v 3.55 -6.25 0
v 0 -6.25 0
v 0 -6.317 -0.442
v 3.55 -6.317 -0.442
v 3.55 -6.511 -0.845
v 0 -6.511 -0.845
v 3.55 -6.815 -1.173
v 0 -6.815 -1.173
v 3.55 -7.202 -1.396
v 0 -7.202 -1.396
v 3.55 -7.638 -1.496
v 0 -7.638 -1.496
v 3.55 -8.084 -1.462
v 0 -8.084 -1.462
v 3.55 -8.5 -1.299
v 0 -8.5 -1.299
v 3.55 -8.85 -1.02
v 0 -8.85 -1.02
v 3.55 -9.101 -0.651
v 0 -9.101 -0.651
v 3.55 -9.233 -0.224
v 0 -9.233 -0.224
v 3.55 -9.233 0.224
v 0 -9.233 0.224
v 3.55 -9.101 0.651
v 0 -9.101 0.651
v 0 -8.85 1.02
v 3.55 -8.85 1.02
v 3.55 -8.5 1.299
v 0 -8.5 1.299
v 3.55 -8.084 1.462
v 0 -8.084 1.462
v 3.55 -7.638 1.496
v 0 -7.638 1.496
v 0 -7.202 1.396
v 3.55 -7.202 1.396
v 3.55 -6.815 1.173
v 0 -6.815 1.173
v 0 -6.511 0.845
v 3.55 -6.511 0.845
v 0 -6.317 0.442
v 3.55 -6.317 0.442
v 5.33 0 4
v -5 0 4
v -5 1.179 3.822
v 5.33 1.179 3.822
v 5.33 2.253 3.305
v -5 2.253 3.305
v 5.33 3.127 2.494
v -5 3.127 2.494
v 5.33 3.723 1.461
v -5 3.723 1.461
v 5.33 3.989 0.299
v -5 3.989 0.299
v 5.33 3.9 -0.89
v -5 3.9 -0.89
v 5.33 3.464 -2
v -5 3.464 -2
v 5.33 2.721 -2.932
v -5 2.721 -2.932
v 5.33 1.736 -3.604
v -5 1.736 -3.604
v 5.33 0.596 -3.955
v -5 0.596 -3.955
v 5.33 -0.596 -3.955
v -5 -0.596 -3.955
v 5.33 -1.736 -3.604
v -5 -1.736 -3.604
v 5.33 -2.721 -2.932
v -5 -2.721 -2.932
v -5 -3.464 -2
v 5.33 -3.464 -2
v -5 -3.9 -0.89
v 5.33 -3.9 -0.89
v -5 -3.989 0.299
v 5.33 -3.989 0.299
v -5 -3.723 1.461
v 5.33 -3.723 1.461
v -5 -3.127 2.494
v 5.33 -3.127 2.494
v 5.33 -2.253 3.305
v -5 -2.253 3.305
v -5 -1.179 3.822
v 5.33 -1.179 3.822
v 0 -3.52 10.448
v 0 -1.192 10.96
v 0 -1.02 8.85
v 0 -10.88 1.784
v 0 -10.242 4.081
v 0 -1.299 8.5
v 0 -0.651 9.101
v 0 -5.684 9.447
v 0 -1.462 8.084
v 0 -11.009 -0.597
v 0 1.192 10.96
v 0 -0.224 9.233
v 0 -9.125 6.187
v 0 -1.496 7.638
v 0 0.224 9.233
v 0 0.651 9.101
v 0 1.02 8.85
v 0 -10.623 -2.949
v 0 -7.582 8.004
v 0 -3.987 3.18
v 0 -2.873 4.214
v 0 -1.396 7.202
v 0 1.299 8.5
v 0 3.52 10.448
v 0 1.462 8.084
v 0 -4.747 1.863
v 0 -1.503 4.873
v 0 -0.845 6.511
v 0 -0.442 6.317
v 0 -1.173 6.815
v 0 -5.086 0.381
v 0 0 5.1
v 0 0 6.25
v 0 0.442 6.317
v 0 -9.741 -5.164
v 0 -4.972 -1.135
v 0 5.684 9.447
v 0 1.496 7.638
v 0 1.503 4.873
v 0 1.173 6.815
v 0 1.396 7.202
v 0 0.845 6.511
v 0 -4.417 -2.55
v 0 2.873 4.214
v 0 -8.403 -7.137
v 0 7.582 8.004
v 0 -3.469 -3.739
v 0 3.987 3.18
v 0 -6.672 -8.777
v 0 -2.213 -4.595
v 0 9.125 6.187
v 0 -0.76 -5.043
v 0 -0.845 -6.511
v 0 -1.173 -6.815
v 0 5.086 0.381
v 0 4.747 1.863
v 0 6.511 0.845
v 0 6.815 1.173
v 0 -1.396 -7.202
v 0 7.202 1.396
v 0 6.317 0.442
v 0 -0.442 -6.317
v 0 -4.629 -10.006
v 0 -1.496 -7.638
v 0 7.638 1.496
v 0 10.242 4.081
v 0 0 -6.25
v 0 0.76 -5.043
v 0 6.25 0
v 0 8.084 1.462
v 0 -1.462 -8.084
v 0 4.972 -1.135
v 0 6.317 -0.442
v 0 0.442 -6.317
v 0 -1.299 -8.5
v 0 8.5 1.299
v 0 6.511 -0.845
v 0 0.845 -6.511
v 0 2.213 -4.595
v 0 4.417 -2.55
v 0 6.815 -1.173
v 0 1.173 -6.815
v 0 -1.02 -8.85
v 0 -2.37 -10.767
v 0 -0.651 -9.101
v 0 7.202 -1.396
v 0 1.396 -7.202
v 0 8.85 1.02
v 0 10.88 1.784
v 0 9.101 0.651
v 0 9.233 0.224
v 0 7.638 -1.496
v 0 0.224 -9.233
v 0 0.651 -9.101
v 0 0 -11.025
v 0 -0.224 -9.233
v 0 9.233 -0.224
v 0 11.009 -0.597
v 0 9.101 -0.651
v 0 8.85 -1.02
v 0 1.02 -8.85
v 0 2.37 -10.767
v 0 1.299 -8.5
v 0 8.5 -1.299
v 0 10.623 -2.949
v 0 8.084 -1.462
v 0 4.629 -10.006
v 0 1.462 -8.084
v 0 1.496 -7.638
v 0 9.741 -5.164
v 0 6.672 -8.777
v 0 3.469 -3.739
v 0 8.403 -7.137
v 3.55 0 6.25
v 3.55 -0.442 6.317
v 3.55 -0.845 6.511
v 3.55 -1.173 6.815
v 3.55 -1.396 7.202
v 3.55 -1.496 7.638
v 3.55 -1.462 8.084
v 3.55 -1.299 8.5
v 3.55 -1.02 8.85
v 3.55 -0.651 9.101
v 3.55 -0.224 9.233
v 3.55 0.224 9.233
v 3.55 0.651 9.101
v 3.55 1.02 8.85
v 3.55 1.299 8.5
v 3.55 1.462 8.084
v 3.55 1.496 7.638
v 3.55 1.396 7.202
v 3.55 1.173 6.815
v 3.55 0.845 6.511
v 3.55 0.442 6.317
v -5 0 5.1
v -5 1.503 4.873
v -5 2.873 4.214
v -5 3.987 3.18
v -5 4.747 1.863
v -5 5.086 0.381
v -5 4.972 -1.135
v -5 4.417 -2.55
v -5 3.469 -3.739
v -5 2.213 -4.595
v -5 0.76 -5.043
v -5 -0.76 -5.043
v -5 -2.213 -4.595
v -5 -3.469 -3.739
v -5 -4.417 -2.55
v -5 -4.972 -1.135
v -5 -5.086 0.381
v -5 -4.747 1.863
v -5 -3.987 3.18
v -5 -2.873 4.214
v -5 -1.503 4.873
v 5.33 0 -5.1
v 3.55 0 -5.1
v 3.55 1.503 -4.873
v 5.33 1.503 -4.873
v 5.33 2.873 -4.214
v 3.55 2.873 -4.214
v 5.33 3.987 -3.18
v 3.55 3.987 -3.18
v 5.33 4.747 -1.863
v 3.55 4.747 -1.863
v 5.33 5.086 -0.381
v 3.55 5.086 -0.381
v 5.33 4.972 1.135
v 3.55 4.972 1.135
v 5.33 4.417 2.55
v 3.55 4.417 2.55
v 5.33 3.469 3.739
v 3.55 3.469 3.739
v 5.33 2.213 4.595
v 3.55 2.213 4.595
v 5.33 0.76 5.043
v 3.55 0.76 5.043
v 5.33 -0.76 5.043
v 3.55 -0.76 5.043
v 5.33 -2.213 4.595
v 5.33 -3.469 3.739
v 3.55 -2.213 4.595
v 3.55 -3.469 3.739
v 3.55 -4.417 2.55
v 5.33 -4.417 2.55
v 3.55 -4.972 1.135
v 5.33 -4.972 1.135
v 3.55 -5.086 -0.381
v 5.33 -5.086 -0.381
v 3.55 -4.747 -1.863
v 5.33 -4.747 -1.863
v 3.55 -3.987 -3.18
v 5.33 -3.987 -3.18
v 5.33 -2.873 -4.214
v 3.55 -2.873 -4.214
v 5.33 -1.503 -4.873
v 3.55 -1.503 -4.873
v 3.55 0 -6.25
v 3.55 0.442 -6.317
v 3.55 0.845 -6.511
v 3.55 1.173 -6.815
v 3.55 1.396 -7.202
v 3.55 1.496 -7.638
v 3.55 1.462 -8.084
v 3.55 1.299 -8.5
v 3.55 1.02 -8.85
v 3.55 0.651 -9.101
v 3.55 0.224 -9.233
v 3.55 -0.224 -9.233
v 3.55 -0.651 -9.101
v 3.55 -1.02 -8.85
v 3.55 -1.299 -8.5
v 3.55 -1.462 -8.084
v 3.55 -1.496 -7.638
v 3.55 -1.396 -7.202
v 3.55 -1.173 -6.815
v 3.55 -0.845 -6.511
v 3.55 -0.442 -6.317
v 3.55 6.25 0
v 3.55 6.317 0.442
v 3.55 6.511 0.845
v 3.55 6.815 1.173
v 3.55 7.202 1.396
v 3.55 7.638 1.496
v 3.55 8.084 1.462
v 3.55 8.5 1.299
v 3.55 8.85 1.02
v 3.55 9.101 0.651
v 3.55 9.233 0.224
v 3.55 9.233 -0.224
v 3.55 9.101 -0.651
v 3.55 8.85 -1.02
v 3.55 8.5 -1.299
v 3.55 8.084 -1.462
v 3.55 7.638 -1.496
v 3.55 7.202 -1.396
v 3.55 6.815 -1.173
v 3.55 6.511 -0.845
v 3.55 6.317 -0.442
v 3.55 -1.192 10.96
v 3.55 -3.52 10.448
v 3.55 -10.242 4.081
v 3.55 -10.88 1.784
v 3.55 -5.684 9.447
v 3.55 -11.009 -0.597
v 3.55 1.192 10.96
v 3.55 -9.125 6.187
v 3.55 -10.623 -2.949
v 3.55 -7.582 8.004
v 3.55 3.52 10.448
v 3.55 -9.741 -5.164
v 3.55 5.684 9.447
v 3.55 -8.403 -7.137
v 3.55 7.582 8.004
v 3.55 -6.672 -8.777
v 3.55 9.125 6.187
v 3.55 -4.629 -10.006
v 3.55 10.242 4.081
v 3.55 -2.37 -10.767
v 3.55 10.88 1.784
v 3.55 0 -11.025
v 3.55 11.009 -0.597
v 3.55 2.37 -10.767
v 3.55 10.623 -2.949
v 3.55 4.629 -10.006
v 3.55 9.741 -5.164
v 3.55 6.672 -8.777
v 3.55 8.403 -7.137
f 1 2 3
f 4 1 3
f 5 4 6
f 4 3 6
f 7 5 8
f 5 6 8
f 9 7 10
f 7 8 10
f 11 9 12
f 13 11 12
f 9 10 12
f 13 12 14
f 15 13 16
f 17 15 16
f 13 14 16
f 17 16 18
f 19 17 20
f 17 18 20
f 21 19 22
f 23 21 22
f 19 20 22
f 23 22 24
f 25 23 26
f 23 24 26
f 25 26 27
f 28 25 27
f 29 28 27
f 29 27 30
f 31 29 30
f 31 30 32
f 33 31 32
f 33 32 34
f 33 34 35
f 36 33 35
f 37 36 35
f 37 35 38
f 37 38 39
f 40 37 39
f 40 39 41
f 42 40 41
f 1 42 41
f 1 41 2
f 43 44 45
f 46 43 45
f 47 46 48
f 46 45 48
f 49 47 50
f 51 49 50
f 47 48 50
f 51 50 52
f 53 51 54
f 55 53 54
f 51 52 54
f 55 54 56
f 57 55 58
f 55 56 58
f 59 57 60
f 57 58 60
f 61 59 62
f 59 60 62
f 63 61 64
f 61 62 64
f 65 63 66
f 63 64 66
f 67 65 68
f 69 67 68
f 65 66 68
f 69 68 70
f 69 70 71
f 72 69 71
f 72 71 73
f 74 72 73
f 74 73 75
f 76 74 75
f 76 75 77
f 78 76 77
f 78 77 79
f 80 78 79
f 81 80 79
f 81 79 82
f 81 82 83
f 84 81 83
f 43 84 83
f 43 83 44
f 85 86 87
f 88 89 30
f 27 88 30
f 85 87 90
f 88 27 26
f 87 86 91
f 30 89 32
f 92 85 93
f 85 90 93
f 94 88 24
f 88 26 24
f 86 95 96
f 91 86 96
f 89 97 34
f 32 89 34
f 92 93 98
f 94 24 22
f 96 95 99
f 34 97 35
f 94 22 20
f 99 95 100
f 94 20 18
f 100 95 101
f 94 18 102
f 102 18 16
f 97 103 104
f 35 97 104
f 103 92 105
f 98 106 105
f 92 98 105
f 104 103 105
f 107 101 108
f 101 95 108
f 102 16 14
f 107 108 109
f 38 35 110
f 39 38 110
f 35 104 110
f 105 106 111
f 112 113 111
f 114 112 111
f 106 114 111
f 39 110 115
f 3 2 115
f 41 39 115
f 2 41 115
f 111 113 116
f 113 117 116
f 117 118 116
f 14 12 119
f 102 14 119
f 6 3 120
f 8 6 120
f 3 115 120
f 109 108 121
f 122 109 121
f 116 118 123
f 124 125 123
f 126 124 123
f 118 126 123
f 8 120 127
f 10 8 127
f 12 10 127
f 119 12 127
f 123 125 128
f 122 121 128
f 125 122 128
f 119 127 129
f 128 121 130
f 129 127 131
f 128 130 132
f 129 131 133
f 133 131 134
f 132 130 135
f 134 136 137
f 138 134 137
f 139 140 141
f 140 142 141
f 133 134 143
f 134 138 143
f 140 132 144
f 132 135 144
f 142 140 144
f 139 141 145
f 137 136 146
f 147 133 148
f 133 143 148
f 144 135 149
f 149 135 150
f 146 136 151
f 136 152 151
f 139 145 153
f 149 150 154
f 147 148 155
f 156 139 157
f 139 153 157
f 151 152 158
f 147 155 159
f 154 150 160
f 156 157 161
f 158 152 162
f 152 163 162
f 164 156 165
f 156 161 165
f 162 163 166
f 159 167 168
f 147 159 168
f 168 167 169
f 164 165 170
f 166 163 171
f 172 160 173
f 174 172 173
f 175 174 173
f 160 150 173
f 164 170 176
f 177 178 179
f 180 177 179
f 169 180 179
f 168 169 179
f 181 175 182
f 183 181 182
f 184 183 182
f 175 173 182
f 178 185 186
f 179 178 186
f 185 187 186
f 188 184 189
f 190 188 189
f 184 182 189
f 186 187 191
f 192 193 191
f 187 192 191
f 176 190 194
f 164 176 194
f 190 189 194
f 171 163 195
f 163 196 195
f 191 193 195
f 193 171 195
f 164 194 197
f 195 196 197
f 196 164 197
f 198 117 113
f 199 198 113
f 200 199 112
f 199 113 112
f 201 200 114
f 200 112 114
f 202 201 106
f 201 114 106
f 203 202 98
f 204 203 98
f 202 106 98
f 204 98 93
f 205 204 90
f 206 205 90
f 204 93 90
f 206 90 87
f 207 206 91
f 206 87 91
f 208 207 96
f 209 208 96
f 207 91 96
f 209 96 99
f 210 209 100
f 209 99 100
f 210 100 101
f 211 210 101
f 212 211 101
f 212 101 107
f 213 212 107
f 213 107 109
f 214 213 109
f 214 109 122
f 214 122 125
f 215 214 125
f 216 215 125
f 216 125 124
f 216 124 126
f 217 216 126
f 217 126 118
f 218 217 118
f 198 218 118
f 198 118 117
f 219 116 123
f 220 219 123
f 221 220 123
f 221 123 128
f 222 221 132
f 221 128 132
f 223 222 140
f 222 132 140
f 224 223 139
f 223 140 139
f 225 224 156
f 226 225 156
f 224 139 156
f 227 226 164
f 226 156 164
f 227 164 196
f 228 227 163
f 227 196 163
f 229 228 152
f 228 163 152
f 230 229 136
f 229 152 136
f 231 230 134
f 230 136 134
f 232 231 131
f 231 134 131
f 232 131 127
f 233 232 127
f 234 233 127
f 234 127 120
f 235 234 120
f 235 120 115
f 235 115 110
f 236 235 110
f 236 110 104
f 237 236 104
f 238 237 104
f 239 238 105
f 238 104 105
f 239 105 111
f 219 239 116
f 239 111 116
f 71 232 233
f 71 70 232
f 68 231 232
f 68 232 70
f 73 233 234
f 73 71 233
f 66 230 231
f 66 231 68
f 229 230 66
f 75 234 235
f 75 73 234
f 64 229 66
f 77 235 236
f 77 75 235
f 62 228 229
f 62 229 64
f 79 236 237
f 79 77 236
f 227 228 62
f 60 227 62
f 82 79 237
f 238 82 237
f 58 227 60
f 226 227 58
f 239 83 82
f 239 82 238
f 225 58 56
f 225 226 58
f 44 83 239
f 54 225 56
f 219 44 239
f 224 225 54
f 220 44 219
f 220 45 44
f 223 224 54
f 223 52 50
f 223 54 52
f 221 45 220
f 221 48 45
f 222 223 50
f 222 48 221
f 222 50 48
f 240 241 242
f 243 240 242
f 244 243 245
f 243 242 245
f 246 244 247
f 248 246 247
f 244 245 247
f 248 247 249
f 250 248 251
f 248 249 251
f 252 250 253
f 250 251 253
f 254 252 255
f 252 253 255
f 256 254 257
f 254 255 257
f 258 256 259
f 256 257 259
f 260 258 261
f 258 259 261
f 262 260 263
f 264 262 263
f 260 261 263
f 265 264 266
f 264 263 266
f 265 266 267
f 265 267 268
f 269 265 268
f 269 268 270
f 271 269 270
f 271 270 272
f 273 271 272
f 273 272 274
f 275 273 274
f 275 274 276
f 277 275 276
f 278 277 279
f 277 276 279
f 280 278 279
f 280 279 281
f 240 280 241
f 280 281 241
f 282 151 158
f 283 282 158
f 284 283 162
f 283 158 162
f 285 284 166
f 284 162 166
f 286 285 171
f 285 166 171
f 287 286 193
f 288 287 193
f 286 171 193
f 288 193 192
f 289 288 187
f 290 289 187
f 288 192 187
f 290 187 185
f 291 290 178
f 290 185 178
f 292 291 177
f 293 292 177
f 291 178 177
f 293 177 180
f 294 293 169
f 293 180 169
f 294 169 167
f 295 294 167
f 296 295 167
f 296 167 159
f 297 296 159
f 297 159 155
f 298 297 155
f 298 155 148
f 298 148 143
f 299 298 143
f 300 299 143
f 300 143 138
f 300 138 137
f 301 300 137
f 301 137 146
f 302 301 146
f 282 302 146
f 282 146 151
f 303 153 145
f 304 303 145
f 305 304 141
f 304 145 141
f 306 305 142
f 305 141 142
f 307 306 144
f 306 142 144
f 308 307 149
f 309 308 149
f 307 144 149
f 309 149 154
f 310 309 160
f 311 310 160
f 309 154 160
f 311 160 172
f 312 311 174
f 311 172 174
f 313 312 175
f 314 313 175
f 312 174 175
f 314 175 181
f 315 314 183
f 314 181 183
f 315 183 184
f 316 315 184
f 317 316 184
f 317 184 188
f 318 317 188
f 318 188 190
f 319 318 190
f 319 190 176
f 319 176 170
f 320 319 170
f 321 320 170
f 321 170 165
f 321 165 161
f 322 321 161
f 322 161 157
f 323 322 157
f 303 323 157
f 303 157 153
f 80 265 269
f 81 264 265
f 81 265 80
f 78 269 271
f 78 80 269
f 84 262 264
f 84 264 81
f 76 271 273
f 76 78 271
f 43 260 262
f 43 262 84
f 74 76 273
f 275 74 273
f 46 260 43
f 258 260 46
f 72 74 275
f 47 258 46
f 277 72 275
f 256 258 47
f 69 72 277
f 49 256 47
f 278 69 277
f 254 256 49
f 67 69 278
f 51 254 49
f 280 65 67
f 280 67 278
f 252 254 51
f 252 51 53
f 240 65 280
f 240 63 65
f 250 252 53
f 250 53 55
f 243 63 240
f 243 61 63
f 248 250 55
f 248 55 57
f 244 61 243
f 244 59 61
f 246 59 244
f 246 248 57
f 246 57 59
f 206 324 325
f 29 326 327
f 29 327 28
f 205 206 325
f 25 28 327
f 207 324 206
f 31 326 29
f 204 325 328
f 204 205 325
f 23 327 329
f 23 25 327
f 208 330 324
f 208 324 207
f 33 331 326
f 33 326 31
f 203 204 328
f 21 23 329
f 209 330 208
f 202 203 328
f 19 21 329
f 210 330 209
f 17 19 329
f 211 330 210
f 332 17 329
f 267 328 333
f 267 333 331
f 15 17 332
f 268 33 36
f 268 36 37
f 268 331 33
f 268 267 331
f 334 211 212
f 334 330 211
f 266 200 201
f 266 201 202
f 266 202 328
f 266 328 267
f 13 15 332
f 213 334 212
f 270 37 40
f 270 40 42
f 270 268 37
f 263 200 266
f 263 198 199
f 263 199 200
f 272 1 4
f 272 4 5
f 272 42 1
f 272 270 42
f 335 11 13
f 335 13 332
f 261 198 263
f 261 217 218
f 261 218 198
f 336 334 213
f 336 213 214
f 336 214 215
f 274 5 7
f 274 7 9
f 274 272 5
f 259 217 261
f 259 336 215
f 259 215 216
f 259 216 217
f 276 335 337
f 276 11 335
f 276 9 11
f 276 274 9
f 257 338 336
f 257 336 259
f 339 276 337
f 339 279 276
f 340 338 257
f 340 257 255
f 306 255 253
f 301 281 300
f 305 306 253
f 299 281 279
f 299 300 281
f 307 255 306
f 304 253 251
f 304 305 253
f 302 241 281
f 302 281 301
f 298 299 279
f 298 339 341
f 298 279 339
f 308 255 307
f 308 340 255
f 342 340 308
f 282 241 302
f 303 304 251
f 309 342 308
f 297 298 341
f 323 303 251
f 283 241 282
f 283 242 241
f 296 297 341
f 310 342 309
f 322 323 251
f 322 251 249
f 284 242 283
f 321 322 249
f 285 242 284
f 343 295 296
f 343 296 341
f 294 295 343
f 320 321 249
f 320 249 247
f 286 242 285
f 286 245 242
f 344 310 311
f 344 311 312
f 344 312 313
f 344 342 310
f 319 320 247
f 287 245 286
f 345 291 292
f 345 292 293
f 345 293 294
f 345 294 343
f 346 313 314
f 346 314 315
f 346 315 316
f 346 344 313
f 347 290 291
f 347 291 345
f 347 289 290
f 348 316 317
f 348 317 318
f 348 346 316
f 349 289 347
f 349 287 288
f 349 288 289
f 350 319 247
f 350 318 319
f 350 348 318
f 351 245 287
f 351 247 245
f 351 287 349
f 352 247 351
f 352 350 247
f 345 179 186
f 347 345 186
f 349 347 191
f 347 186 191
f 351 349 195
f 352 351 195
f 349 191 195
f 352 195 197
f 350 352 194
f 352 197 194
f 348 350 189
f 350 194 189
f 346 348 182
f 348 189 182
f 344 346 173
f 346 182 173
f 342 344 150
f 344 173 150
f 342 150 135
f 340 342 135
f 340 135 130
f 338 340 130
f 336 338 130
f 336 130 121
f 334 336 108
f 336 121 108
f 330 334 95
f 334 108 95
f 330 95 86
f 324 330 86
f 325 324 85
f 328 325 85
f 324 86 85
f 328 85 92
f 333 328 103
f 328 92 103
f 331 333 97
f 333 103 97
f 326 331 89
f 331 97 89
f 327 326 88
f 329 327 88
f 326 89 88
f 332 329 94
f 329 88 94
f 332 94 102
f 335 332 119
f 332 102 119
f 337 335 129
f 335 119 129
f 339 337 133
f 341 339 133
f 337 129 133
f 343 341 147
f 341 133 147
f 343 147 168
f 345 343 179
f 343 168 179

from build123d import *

# Parameters (mm, degrees)
SKETCH1_R           = 11.025
BOSS_EXTRUDE1_DEPTH = 3.55
SKETCH2_R           = 5.1
BOSS_EXTRUDE2_DEPTH = 1.78
SKETCH3_R           = 5.1
BOSS_EXTRUDE3_DEPTH = 5
SKETCH5_R           = 4
CUT_EXTRUDE1_DEPTH  = 11.33
SKETCH6_R           = 1.5
CUT_EXTRUDE2_DEPTH  = 6.33
CIRPATTERN1_COUNT   = 4


with BuildPart() as part:
    # Sketch1 → Boss-Extrude1 (new body)
    with BuildSketch(Plane(origin=(0, 0, 0), x_dir=(0, 0, -1), z_dir=(1, 0, 0))):
        Circle(SKETCH1_R)
    extrude(amount=BOSS_EXTRUDE1_DEPTH)

    # Sketch2 → Boss-Extrude2 (add)
    with BuildSketch(Plane(origin=(3.55, 0, 0), x_dir=(0, 0, -1), z_dir=(1, 0, 0))):
        Circle(SKETCH2_R)
    extrude(amount=BOSS_EXTRUDE2_DEPTH)

    # Sketch3 → Boss-Extrude3 (add)
    with BuildSketch(Plane.ZY):
        Circle(SKETCH3_R)
    extrude(amount=BOSS_EXTRUDE3_DEPTH)

    # Sketch5 → Cut-Extrude1 (cut, through all)
    with BuildSketch(Plane.ZY.offset(5)):
        Circle(SKETCH5_R)
    extrude(amount=-CUT_EXTRUDE1_DEPTH, mode=Mode.SUBTRACT)

    # Sketch6 → Cut-Extrude2 (cut, through all)
    with BuildSketch(Plane.ZY):
        with Locations((-7.75, 0)):
            Circle(SKETCH6_R)
    cut_extrude2 = extrude(amount=-CUT_EXTRUDE2_DEPTH, mode=Mode.SUBTRACT)

    # CirPattern1: Cut-Extrude2 ×4 about axis
    cirpattern1_axis = Axis((0, 0, 0), (1, 0, 0))
    for i in range(1, CIRPATTERN1_COUNT):
        add(cut_extrude2.rotate(cirpattern1_axis, i * 360 / CIRPATTERN1_COUNT), mode=Mode.SUBTRACT)


solid = part.part
